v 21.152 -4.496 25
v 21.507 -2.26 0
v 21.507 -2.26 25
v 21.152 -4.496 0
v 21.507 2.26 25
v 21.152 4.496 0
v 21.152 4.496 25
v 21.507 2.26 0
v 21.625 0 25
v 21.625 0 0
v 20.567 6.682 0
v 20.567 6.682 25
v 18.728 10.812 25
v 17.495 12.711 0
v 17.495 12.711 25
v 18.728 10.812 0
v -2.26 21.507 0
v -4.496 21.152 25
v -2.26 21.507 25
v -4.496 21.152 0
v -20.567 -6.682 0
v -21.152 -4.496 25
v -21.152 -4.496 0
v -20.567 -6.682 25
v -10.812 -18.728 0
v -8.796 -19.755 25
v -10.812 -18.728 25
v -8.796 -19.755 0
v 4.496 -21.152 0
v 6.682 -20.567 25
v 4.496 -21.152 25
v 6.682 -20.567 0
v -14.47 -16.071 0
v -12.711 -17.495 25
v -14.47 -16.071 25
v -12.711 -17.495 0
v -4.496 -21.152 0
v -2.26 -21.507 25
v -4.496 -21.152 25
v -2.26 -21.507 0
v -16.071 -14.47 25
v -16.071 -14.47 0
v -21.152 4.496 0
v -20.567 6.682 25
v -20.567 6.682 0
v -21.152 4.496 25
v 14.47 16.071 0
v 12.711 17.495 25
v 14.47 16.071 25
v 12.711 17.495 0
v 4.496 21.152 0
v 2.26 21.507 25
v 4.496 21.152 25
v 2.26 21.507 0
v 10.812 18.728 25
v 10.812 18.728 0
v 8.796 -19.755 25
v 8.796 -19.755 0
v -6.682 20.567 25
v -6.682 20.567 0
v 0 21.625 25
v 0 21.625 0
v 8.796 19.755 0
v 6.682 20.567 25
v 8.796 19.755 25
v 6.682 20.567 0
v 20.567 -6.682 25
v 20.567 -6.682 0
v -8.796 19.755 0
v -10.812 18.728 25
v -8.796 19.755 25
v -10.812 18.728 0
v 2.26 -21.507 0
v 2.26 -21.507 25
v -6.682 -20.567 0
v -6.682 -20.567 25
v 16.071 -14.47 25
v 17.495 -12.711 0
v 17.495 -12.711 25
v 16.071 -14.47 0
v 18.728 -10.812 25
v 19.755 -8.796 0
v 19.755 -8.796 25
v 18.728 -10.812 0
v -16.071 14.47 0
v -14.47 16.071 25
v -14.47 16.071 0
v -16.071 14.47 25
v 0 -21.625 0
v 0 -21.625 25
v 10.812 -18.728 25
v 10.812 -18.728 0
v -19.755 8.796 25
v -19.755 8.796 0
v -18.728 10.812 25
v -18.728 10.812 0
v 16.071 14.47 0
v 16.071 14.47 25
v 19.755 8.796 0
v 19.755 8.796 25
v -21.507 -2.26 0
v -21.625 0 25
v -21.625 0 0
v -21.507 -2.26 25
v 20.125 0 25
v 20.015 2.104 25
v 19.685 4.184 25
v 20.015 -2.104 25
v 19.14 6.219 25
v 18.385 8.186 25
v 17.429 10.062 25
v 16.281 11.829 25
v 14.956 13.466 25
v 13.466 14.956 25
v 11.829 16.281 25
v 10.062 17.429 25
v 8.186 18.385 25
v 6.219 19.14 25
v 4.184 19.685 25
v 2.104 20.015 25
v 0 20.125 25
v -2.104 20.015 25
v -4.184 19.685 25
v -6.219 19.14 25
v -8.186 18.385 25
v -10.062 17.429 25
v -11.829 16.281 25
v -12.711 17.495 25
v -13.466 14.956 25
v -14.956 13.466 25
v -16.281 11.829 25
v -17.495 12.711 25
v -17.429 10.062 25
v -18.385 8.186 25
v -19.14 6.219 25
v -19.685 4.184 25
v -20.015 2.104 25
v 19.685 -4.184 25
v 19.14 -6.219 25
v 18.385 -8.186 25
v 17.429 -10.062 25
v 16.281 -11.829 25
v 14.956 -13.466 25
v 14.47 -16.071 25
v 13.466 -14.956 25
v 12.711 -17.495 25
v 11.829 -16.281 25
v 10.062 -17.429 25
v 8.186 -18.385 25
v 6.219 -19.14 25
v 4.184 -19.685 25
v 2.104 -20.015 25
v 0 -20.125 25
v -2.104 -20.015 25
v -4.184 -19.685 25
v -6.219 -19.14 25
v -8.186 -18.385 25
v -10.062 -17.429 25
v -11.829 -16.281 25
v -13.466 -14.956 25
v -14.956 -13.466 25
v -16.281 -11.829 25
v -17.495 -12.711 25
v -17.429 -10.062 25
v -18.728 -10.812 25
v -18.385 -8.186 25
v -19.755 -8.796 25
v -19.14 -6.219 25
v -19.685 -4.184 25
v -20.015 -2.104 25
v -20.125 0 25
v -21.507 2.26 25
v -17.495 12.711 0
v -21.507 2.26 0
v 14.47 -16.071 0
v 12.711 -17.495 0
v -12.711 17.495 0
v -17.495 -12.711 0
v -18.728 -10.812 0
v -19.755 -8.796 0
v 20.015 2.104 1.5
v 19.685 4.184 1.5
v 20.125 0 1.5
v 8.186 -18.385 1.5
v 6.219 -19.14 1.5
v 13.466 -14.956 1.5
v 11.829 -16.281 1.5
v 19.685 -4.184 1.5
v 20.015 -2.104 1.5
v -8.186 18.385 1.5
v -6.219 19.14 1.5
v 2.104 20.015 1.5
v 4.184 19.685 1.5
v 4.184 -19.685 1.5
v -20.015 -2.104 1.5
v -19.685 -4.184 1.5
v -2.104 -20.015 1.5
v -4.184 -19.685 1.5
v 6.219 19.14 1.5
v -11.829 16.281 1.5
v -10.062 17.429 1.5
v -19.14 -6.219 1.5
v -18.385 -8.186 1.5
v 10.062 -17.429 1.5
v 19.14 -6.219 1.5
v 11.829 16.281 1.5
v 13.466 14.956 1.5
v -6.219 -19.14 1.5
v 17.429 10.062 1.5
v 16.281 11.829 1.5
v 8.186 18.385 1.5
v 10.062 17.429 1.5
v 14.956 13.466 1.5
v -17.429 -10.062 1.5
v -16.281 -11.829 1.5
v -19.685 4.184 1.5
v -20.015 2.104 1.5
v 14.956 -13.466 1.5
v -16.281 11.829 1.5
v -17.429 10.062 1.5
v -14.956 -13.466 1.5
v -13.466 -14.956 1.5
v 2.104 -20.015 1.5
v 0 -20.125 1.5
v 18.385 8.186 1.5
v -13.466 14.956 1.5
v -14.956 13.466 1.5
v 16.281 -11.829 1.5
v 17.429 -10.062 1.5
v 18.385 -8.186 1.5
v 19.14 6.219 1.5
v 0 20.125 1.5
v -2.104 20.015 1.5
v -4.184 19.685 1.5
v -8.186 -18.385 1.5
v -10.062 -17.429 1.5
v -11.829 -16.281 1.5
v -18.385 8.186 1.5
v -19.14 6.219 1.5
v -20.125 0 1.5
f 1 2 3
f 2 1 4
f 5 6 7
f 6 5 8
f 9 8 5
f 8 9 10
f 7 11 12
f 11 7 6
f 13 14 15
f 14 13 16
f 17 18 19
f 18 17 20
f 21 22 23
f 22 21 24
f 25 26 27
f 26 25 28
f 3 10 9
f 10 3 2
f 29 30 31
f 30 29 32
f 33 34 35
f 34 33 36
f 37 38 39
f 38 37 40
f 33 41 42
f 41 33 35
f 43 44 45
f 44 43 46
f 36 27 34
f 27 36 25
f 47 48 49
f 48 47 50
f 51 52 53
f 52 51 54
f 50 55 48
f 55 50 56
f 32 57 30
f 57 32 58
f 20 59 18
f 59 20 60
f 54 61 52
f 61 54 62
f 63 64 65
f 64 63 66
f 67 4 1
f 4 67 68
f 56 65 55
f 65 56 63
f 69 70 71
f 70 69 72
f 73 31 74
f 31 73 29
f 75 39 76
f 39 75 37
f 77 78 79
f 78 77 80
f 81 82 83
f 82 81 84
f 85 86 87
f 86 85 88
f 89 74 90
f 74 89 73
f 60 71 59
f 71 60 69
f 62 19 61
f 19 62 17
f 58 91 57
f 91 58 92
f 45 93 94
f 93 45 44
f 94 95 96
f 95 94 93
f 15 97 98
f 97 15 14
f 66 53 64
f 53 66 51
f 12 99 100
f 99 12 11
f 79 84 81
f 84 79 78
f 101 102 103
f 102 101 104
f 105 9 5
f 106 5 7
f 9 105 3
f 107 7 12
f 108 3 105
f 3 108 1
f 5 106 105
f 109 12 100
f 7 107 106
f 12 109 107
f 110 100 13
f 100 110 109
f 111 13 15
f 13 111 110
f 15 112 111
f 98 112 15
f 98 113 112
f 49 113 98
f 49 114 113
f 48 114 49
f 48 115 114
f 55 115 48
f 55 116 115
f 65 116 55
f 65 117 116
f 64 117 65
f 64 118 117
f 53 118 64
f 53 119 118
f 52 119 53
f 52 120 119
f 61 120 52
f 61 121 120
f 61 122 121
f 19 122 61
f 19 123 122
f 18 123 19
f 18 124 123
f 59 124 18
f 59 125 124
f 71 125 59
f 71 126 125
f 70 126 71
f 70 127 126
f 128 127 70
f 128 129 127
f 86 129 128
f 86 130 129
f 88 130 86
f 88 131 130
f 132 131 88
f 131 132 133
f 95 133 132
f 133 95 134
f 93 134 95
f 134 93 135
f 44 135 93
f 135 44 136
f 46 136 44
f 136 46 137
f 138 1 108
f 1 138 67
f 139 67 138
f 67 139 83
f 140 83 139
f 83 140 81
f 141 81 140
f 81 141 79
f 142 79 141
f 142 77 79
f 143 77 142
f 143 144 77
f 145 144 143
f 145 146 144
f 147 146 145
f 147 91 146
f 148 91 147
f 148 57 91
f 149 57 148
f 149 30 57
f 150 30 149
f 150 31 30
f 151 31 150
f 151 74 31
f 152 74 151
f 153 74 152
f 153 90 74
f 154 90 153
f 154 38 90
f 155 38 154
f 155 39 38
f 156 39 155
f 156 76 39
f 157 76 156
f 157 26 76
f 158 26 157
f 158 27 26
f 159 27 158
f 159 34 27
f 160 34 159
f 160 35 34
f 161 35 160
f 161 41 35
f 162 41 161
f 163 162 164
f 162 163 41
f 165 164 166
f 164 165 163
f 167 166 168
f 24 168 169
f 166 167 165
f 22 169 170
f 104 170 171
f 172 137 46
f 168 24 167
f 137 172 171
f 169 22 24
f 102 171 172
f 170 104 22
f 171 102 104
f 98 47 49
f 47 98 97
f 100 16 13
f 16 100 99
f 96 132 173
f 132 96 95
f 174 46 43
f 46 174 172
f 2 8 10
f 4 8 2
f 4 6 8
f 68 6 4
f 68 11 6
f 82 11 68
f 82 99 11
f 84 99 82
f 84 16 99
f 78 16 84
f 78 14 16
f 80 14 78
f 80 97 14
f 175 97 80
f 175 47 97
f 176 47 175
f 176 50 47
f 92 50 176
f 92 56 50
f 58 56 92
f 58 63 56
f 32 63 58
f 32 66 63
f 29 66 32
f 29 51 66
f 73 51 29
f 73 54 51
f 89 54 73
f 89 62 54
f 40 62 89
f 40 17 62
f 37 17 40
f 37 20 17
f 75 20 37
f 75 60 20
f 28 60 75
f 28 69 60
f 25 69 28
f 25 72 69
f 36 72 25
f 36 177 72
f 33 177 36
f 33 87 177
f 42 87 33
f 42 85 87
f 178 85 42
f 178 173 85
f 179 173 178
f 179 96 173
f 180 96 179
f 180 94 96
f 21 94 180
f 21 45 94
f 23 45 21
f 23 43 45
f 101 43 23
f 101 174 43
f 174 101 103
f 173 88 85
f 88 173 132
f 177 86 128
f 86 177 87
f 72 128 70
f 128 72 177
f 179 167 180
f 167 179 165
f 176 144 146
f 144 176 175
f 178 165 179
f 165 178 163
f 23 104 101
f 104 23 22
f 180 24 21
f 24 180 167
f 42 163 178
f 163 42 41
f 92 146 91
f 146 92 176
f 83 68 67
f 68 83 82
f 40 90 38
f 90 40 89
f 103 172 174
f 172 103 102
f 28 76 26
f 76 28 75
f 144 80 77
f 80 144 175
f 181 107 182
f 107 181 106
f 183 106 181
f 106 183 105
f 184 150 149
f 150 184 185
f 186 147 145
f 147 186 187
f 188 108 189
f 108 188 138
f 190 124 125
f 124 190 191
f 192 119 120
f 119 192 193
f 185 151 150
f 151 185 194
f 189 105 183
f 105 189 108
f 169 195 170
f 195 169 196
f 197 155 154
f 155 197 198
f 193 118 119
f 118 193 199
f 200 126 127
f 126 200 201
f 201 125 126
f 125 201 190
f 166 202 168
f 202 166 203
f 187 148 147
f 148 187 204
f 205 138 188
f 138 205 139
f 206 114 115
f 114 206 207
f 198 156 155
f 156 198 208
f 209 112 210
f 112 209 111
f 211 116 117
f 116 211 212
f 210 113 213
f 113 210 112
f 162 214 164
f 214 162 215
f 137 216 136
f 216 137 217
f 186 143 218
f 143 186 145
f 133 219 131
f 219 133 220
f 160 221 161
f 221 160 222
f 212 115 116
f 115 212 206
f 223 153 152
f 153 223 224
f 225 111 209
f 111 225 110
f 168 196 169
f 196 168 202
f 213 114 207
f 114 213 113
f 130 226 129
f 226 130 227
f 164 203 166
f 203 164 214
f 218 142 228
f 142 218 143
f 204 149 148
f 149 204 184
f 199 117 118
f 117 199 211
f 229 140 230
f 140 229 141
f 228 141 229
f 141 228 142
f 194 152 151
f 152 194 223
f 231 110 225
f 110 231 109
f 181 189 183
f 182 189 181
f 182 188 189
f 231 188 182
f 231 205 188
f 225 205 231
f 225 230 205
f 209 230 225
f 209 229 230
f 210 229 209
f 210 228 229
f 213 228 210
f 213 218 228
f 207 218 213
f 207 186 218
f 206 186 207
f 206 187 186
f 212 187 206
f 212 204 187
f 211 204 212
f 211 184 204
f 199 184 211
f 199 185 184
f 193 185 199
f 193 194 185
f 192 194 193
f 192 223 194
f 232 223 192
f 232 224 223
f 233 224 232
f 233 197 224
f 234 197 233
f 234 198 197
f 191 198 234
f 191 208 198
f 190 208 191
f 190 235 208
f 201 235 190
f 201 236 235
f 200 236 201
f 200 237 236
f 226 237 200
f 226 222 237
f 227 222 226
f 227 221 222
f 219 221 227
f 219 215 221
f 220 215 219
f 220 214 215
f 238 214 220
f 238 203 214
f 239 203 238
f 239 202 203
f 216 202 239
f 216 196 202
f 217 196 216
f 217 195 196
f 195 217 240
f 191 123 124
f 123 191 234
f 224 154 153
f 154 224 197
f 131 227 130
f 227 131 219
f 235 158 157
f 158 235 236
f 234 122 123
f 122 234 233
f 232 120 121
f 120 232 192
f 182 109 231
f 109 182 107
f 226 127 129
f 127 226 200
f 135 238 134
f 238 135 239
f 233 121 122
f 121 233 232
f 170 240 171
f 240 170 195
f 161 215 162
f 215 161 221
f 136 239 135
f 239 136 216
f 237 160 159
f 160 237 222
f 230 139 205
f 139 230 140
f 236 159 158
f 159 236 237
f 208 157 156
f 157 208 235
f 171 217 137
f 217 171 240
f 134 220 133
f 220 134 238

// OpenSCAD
$fn=60;
wall = 1.5;
diameter = 40.25;
height = 25;

radius = diameter / 2;

difference()
{
    cylinder(r=radius + wall, h=height);
    translate([0,0,wall])cylinder(r=radius, h=height+.1);
}
